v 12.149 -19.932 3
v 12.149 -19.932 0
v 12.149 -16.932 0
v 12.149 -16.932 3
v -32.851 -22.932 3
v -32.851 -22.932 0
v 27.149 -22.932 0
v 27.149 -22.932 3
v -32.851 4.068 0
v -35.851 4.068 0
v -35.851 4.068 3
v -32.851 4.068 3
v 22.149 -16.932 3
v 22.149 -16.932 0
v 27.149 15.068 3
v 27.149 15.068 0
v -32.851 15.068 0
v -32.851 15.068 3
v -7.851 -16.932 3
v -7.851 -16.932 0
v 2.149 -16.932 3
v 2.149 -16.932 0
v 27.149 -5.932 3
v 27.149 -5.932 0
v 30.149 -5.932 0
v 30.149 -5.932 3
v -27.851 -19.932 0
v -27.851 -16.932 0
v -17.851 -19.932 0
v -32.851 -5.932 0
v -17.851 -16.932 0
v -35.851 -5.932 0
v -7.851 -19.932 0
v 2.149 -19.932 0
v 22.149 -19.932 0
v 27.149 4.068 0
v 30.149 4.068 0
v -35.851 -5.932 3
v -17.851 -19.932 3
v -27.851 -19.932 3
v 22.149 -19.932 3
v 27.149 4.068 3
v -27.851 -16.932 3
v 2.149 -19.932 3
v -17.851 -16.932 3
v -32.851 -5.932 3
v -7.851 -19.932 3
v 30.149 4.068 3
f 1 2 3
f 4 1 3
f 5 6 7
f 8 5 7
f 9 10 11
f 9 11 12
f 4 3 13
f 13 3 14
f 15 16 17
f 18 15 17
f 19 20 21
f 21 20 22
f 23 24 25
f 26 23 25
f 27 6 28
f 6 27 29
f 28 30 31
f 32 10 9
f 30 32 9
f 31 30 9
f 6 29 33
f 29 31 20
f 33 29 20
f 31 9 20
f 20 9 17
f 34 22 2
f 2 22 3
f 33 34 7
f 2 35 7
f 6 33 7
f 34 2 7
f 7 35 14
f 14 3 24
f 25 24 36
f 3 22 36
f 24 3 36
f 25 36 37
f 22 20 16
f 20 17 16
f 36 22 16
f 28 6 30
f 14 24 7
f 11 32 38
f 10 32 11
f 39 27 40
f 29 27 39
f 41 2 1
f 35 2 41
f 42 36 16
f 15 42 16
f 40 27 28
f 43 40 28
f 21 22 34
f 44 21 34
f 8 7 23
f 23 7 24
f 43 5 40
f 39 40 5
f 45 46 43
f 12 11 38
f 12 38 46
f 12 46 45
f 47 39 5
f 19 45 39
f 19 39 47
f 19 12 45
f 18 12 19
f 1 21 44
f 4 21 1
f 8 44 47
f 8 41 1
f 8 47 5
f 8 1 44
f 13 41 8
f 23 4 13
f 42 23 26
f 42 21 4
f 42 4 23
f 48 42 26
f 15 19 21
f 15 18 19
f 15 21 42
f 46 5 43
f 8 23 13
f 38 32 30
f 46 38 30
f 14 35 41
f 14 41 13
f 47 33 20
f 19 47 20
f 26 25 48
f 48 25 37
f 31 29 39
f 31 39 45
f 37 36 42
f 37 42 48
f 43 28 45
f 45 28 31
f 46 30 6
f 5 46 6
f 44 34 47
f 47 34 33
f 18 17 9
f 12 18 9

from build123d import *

# Parameters (mm, degrees)
SKETCH1_W           = 10
SKETCH1_H           = 3
SKETCH1_W_2         = 3
SKETCH1_H_2         = 10
BOSS_EXTRUDE1_DEPTH = 3


with BuildPart() as part:
    # Sketch1 → Boss-Extrude1 (new body)
    # profile 1 of 4: a face of its own
    with BuildSketch(Plane.XY):
        Polygon((-2.850678733, -16.932126697), (-2.850678733, 15.067873303), (-32.850678733, 15.067873303), (-32.850678733, 4.067873303), (-32.850678733, -5.932126697), (-32.850678733, -22.932126697), (-2.850678733, -22.932126697), (-2.850678733, -19.932126697), (-7.850678733, -19.932126697), (-7.850678733, -16.932126697), align=None)
        with Locations((-22.850678733, -18.432126697)):
            Rectangle(SKETCH1_W, SKETCH1_H, mode=Mode.SUBTRACT)
    # profile 2 of 4: a face of its own
    with BuildSketch(Plane.XY):
        Polygon((27.149321267, 15.067873303), (-2.850678733, 15.067873303), (-2.850678733, -16.932126697), (2.149321267, -16.932126697), (2.149321267, -19.932126697), (-2.850678733, -19.932126697), (-2.850678733, -22.932126697), (27.149321267, -22.932126697), (27.149321267, -5.932126697), (27.149321267, 4.067873303), align=None)
        with Locations((17.149321267, -18.432126697)):
            Rectangle(SKETCH1_W, SKETCH1_H, mode=Mode.SUBTRACT)
    # profile 3 of 4: a face of its own
    with BuildSketch(Plane.XY):
        with Locations((-34.350678733, -0.932126697)):
            Rectangle(SKETCH1_W_2, SKETCH1_H_2)
    # profile 4 of 4: a face of its own
    with BuildSketch(Plane.XY):
        with Locations((28.649321267, -0.932126697)):
            Rectangle(SKETCH1_W_2, SKETCH1_H_2)
    extrude(amount=BOSS_EXTRUDE1_DEPTH)


solid = part.part
